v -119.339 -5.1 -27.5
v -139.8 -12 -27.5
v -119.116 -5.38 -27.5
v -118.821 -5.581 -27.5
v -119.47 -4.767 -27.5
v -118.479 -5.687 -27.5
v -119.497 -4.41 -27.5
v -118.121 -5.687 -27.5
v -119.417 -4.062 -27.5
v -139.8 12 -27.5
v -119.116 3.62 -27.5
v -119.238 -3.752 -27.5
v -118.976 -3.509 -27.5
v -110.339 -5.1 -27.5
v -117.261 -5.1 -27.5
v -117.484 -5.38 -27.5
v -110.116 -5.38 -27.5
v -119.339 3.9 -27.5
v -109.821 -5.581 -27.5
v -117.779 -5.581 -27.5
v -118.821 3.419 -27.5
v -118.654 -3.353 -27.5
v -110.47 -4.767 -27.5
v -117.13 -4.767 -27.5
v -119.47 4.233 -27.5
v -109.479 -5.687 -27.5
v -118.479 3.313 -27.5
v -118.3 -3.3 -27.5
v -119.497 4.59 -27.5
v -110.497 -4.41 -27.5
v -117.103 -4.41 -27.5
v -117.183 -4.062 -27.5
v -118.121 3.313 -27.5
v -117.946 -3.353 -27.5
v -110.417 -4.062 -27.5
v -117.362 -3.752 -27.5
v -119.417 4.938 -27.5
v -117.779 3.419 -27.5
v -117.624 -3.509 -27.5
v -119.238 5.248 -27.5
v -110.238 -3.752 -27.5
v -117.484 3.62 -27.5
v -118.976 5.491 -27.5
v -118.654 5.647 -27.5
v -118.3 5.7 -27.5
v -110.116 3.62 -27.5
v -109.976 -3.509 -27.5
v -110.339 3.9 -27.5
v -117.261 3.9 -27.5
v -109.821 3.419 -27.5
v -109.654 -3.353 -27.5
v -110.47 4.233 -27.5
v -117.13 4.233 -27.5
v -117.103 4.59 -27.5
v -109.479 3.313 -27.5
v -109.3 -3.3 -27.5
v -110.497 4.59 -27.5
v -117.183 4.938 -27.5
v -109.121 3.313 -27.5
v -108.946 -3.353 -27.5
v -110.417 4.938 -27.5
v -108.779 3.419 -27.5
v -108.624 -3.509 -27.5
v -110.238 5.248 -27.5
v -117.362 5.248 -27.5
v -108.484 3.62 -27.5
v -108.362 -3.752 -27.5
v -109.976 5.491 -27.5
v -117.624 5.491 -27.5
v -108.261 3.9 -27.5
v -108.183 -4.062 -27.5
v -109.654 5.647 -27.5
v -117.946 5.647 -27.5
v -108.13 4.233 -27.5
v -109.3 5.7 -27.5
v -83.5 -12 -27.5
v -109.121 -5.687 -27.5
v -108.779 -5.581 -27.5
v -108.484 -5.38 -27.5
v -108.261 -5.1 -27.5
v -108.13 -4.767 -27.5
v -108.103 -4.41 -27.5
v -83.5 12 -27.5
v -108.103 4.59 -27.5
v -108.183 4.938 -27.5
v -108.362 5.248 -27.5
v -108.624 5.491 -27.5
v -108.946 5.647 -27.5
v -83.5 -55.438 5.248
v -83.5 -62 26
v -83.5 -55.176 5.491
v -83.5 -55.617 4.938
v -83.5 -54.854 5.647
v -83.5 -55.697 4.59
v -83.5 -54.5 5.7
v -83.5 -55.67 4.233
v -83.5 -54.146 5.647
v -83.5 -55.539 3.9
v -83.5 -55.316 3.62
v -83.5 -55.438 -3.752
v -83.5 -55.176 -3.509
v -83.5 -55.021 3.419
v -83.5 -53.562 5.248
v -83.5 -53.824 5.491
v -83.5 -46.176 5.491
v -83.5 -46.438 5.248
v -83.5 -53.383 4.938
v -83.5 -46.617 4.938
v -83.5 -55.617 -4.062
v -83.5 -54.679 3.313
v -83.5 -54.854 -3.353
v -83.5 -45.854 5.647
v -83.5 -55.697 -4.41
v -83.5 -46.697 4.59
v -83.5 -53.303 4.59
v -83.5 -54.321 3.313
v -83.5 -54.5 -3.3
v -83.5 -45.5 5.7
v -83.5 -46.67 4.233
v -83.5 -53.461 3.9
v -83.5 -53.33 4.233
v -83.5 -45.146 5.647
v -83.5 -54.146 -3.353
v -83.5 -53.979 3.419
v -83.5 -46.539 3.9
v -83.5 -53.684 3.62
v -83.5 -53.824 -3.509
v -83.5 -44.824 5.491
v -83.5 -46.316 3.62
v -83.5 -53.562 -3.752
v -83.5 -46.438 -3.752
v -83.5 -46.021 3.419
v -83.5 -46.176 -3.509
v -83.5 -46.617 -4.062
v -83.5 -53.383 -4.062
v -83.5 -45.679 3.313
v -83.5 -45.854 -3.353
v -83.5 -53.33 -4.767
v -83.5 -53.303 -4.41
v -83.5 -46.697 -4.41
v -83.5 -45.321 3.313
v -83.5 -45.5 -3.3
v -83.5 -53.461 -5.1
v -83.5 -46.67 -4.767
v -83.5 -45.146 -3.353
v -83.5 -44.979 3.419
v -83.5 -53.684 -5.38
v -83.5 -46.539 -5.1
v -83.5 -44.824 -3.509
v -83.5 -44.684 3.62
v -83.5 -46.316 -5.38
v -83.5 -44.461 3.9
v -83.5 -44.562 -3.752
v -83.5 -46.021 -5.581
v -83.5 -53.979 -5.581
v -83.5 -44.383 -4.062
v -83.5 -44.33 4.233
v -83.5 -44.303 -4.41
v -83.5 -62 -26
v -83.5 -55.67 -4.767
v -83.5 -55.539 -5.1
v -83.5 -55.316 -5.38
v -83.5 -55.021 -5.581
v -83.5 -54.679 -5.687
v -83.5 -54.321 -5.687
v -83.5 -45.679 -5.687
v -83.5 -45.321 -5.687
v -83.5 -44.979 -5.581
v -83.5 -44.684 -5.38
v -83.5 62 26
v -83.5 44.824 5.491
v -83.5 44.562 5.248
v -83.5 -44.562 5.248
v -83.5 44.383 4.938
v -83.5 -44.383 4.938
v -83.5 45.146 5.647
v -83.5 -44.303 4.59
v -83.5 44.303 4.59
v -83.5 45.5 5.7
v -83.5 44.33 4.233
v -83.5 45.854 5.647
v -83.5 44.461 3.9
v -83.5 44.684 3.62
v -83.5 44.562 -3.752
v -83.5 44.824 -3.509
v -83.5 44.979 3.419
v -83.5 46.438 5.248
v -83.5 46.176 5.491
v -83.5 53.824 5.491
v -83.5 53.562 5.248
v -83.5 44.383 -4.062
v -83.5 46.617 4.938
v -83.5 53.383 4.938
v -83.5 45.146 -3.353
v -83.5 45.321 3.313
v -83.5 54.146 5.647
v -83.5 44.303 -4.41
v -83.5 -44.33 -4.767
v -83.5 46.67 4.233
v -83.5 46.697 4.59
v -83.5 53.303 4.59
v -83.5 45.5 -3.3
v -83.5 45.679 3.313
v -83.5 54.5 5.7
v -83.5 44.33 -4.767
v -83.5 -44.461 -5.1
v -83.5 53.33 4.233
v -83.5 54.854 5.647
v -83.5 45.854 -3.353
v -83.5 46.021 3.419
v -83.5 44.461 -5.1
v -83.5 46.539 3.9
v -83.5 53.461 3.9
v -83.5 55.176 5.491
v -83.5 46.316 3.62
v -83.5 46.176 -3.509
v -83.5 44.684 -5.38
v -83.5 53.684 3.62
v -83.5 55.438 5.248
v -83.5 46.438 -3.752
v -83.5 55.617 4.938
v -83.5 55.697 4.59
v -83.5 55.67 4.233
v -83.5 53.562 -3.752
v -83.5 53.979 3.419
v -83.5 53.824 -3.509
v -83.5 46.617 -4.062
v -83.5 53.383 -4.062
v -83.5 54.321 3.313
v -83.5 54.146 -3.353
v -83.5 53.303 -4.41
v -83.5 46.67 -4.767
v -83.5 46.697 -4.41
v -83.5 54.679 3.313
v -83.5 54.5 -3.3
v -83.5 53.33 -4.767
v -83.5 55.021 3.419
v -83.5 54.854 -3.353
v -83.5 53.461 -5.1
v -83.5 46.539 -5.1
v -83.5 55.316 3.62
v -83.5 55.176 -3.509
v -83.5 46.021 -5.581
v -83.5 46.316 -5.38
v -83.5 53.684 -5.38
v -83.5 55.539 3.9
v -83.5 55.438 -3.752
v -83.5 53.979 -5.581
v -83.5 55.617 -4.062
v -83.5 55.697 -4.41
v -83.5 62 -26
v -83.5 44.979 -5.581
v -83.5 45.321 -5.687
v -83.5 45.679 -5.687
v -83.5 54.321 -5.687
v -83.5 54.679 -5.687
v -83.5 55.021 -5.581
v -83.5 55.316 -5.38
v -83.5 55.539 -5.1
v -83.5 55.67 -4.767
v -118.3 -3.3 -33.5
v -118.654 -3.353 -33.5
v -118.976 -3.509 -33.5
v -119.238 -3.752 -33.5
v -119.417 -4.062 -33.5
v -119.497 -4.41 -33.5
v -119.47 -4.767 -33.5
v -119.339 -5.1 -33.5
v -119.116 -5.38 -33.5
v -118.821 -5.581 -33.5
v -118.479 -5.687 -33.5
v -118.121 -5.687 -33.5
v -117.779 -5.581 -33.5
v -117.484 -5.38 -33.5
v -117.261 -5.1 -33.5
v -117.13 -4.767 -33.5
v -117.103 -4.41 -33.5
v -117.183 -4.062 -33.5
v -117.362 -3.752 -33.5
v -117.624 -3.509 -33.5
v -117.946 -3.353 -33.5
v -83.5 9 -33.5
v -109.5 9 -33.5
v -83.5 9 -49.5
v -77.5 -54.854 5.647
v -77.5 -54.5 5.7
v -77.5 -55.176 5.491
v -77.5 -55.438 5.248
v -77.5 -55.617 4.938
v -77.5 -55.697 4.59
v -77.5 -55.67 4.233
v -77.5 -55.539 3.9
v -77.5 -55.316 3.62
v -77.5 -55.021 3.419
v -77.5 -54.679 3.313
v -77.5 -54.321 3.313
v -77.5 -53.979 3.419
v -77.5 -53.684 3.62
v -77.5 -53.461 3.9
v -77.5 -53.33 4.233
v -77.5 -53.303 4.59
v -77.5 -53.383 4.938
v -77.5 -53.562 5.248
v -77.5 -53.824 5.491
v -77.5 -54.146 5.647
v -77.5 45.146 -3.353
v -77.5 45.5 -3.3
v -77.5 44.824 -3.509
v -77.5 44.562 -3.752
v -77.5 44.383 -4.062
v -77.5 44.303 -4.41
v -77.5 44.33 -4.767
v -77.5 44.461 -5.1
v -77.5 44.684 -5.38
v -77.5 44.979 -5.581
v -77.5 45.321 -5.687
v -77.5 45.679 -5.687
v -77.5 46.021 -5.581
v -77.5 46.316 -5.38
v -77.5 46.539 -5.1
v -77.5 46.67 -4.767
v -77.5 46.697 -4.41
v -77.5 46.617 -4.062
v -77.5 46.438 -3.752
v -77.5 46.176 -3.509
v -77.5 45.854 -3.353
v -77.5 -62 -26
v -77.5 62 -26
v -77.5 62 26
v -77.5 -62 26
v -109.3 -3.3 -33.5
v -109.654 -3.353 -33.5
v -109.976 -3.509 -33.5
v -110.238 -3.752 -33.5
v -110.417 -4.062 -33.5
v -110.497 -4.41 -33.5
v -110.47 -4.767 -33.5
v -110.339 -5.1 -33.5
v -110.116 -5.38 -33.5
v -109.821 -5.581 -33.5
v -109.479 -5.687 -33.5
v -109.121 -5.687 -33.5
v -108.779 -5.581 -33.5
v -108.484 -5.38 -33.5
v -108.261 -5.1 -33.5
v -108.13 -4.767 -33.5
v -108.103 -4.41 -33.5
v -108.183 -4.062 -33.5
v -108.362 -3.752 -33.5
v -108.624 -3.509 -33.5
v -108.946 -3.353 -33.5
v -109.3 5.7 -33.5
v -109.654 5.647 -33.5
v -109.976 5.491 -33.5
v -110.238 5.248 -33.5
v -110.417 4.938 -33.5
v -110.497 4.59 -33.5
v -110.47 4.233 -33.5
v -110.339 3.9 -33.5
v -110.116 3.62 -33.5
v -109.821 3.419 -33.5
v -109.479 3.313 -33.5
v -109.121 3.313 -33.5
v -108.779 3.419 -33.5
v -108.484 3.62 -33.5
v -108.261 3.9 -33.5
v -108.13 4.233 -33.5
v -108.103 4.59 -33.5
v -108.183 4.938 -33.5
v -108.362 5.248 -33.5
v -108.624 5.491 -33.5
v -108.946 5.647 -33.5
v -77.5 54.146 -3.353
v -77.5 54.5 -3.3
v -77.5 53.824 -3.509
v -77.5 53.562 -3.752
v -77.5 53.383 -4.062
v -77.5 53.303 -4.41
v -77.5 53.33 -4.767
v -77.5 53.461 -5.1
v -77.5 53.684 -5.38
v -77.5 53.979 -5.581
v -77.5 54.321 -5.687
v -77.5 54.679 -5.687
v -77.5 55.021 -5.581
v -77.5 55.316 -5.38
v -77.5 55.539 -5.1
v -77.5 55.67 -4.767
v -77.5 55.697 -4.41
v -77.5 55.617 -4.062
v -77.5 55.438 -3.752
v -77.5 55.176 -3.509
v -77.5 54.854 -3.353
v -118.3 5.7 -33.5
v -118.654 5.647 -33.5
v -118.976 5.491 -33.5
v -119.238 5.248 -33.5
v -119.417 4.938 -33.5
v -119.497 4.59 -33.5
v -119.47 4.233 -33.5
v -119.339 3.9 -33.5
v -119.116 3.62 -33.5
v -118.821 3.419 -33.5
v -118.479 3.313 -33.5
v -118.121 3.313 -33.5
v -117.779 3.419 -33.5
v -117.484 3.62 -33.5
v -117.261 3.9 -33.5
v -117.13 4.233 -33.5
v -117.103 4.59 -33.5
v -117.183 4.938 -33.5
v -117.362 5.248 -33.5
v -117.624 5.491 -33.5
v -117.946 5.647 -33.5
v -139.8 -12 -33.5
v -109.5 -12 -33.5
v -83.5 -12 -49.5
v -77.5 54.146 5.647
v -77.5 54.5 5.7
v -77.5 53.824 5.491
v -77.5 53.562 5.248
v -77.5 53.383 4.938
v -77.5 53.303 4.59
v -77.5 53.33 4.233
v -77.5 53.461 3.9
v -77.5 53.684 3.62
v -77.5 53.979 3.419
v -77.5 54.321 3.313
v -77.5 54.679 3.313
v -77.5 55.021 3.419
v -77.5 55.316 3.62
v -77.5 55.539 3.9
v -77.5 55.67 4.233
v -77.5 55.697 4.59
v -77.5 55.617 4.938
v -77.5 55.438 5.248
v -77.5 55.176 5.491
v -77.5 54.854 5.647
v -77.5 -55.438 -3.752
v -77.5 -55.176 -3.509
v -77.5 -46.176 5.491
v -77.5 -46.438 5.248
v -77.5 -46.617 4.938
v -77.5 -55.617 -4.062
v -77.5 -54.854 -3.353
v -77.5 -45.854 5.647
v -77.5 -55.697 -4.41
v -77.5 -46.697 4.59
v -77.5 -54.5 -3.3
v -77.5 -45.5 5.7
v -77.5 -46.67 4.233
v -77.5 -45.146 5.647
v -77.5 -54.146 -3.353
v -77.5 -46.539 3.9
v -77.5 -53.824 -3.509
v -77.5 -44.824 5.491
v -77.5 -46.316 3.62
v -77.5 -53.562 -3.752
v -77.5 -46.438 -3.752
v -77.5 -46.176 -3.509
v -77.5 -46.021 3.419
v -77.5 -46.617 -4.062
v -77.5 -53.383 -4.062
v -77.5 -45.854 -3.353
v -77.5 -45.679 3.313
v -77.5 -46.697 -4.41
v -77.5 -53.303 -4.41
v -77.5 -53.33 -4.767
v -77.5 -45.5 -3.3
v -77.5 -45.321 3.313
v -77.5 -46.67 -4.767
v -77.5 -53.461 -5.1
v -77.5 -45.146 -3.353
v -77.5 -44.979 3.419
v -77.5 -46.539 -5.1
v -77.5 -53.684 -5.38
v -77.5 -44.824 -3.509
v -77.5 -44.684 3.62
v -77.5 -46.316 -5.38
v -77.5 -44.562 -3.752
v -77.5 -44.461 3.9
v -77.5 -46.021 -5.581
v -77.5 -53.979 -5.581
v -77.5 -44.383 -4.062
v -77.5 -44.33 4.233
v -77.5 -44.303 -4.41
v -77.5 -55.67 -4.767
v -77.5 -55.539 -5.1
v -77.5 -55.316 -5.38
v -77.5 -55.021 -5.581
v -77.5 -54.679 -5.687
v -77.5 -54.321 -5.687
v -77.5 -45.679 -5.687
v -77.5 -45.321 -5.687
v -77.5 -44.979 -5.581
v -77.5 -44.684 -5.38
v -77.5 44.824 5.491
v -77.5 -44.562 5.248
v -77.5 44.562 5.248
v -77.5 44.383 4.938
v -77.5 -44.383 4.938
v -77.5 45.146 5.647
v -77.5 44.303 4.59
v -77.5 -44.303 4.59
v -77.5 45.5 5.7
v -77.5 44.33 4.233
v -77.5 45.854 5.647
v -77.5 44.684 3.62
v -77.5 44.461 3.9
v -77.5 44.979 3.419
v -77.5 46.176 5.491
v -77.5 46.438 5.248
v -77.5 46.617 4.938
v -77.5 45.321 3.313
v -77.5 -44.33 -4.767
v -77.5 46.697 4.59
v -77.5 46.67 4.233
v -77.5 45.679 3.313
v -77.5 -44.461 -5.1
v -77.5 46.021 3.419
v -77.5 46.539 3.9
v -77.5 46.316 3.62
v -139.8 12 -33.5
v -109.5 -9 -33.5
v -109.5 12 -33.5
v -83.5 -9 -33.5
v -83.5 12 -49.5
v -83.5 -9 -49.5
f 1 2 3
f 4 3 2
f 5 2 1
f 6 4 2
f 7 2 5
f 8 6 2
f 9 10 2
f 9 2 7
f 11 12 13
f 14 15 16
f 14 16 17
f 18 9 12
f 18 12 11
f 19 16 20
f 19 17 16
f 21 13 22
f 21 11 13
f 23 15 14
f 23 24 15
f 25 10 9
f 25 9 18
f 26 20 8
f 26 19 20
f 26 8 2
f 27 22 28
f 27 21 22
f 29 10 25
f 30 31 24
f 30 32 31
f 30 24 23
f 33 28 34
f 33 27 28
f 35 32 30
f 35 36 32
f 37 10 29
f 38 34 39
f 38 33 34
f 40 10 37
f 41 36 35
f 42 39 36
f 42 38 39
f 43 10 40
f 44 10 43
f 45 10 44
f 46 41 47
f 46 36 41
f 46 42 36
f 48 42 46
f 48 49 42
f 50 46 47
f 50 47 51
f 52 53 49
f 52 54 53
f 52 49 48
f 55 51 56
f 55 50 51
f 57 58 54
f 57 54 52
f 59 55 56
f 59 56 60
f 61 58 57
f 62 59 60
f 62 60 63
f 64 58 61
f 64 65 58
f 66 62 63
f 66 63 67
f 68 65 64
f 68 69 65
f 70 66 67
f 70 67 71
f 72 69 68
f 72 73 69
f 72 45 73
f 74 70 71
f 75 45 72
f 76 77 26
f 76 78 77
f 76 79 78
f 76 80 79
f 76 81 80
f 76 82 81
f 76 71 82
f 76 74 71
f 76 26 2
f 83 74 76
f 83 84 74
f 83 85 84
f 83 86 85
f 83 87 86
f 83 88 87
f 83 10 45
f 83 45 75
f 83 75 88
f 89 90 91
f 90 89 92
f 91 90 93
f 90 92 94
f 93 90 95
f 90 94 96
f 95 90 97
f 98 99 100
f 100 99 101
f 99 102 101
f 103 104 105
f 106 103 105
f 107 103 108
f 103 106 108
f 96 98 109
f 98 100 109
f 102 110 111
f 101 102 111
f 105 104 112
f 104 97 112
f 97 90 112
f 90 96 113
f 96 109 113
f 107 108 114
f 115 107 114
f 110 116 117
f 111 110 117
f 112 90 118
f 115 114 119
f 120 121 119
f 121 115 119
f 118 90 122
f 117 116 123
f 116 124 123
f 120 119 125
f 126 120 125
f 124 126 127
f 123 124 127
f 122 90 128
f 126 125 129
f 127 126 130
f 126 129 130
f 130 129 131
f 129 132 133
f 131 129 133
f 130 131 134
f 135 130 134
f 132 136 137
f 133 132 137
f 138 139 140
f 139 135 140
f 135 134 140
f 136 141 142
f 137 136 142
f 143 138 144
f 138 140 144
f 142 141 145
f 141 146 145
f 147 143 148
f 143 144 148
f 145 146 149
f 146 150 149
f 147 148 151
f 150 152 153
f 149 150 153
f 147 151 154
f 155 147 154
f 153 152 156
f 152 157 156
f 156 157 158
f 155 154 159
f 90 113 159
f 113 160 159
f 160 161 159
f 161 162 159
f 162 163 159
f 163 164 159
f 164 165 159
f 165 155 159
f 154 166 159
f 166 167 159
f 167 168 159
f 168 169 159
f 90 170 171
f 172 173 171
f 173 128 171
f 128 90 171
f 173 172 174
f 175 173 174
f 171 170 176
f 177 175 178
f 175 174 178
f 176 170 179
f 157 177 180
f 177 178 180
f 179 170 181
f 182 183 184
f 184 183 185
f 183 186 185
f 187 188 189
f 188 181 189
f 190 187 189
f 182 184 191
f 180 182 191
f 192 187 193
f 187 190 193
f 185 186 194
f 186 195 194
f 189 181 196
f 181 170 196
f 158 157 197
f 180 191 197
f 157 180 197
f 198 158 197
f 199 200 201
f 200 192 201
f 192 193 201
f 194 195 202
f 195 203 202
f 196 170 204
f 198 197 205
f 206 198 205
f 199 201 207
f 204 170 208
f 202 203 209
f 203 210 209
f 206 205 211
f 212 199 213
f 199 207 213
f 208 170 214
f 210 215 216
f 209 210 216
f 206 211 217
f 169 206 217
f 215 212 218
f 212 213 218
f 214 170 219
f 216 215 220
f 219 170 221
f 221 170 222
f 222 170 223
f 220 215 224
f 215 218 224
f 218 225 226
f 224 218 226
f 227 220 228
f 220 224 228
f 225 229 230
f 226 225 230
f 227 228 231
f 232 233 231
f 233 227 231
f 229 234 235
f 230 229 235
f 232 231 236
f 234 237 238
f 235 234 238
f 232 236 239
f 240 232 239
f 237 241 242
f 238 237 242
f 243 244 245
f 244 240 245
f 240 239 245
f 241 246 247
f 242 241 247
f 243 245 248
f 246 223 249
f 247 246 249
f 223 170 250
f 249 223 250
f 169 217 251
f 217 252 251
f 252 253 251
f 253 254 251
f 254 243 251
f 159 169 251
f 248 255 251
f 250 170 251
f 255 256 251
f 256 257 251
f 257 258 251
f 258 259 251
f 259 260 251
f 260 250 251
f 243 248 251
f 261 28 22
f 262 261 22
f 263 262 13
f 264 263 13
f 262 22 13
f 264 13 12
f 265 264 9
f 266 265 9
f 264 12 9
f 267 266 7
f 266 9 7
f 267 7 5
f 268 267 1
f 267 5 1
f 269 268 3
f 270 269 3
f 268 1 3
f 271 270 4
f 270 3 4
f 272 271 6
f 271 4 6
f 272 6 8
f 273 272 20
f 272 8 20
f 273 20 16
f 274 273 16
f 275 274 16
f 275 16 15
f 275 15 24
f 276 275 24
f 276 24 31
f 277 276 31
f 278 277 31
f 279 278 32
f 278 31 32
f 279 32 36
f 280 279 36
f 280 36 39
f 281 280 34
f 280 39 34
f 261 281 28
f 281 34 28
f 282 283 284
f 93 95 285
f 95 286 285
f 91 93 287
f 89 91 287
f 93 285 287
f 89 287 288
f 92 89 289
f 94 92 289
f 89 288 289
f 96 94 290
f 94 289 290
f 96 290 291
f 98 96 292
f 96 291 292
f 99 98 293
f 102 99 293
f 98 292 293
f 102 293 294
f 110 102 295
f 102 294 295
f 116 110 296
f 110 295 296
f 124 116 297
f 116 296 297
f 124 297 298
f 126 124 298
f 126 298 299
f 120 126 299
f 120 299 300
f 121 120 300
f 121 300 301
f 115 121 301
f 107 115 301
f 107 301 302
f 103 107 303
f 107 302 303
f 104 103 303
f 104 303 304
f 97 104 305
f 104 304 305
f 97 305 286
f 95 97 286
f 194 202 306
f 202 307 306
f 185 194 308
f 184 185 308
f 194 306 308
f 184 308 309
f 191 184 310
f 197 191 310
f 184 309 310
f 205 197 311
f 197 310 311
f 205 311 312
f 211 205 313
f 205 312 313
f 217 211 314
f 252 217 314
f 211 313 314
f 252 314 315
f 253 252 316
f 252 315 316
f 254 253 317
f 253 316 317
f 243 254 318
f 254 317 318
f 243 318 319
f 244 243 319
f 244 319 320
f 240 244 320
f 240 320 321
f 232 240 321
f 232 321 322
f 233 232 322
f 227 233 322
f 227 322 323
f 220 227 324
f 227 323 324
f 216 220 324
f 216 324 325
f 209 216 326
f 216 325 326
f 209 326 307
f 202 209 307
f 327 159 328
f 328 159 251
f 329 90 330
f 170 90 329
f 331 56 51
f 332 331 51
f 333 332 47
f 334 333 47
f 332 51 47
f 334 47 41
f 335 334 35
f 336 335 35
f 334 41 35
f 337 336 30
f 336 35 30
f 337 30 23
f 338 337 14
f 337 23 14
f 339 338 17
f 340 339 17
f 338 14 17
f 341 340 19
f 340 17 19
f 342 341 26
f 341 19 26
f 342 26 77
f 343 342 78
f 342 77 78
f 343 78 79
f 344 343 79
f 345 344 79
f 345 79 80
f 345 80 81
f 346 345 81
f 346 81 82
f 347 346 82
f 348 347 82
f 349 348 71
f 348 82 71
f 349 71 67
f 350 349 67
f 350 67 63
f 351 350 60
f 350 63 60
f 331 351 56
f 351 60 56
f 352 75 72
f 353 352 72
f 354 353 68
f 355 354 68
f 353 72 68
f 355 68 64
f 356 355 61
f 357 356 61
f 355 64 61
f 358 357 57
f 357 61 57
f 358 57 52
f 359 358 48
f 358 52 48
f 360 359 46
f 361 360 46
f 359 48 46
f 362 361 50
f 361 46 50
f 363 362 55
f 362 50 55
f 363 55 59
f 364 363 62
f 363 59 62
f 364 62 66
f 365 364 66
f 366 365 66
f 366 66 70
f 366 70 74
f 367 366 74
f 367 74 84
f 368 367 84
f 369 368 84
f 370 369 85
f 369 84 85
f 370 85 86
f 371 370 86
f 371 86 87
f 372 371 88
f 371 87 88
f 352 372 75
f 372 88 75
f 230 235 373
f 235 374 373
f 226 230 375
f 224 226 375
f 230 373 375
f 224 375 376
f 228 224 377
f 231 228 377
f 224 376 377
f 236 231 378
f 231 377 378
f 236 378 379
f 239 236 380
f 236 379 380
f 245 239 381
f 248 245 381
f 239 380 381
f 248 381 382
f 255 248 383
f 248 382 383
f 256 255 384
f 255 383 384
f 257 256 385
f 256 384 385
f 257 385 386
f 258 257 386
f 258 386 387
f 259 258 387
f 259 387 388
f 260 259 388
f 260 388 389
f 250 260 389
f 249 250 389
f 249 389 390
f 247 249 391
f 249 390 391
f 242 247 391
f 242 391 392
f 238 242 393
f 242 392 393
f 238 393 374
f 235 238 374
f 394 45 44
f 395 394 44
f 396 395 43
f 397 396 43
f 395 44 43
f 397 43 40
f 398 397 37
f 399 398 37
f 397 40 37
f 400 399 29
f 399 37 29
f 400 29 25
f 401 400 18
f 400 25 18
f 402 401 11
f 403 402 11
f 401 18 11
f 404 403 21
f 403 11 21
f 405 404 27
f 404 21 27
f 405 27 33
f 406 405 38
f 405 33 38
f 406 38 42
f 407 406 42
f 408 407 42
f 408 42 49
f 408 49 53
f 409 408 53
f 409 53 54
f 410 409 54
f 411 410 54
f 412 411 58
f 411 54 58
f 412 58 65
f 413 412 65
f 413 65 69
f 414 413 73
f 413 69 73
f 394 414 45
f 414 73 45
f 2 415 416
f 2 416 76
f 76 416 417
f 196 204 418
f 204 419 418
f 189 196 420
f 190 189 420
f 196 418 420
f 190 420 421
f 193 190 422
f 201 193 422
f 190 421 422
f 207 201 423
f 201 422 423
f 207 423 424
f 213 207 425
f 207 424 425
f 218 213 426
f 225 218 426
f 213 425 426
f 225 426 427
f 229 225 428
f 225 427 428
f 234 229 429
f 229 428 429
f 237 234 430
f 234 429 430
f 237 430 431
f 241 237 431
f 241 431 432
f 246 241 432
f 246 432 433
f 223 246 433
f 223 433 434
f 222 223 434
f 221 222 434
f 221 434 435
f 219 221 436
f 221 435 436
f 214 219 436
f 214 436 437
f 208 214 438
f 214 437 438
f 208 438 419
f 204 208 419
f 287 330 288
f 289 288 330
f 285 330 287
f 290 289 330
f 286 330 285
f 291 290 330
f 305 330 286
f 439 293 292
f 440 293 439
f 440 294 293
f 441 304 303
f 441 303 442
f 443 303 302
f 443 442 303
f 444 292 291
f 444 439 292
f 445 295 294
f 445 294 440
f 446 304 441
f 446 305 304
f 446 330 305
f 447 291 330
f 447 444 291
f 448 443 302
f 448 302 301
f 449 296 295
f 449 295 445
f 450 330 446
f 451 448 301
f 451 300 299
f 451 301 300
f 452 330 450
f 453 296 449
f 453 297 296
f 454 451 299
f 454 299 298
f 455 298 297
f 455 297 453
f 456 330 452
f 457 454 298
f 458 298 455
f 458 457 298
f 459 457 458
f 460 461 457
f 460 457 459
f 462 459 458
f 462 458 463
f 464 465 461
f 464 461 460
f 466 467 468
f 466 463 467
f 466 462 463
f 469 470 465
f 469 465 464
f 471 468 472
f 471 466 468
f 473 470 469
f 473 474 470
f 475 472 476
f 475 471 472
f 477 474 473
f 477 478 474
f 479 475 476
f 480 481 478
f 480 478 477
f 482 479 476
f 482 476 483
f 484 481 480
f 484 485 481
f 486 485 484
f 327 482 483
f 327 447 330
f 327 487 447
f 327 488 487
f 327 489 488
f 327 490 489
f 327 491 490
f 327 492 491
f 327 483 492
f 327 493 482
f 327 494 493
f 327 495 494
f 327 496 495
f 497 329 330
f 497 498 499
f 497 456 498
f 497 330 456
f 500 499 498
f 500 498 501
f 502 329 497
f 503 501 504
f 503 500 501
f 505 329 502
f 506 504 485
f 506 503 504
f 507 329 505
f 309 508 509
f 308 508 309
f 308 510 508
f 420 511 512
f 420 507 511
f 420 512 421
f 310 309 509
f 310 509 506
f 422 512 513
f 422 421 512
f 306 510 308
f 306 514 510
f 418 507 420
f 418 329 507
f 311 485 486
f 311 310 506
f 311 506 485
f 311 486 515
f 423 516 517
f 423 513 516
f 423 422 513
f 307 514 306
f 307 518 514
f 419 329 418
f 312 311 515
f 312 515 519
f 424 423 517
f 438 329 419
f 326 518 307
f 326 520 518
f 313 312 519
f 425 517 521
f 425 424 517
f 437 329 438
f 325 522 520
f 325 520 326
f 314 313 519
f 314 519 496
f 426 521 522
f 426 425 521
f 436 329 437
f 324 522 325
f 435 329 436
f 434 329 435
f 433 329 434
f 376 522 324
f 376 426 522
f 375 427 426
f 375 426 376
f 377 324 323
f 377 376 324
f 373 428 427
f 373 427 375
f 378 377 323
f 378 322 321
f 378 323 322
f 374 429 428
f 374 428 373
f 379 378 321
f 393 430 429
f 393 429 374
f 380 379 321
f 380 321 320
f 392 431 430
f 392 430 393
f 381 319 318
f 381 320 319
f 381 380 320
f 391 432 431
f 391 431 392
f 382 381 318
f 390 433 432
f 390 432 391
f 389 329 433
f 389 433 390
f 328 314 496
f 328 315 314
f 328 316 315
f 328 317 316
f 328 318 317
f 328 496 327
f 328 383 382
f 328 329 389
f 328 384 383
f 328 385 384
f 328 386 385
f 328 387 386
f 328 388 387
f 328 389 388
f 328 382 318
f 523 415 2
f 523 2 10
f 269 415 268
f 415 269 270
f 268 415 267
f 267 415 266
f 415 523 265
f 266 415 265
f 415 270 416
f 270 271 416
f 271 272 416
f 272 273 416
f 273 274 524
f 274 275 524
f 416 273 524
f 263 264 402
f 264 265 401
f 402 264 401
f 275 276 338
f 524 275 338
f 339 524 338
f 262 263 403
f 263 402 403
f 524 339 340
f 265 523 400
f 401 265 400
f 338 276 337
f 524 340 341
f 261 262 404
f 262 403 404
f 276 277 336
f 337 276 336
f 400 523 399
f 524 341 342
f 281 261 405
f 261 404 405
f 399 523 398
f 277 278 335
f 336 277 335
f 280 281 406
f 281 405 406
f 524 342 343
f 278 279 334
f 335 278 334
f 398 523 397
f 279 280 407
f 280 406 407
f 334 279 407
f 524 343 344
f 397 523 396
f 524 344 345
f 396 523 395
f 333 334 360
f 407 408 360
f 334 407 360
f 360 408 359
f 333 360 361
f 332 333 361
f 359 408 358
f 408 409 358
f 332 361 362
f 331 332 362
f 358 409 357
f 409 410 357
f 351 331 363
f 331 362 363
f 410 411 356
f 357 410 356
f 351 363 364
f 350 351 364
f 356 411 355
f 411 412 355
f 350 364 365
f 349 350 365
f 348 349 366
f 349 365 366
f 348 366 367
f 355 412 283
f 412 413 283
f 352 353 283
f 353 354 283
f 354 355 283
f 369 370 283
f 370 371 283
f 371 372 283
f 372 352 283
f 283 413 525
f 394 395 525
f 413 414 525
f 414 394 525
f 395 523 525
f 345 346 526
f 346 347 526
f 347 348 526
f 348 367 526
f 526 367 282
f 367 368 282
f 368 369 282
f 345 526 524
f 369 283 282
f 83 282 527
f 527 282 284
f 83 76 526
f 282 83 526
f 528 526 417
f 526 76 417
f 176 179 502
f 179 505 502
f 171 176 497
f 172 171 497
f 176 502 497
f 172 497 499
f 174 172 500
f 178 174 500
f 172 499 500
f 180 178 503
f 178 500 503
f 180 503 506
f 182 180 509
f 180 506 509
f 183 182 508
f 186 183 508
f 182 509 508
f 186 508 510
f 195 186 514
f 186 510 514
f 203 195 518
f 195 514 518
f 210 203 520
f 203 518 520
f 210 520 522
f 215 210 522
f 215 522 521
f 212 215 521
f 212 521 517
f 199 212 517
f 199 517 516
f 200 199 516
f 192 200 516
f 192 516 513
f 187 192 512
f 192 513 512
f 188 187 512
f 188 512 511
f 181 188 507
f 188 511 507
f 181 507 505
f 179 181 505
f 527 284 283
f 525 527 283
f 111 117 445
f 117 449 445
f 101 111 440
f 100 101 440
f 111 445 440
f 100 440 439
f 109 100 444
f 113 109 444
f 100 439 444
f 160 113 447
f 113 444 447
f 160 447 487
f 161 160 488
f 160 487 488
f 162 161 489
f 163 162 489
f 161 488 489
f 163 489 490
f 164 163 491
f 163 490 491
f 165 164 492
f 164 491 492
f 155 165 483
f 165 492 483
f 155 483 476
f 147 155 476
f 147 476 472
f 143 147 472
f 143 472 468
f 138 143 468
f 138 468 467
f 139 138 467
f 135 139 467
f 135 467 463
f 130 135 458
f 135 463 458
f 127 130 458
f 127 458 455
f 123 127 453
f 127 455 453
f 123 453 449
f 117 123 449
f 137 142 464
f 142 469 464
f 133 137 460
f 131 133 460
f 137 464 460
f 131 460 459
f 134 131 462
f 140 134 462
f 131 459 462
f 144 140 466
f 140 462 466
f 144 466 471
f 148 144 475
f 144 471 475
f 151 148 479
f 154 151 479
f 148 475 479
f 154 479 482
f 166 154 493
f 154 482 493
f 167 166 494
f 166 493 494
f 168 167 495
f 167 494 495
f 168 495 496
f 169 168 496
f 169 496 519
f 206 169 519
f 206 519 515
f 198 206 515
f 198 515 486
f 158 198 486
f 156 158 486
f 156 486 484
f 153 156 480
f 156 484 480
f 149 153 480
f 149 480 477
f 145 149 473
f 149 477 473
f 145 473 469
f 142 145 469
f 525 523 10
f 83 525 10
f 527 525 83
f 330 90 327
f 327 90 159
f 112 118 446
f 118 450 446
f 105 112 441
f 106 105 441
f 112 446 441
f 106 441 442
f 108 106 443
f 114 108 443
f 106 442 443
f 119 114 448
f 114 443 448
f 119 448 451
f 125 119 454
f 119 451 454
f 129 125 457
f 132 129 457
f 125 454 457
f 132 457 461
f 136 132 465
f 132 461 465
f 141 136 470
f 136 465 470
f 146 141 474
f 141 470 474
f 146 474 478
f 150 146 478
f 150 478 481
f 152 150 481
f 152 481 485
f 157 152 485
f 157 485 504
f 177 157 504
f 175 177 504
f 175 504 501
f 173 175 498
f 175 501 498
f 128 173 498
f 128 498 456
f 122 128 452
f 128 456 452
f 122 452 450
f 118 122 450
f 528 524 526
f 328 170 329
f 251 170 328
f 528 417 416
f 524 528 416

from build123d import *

# Parameters (mm, degrees)
SKETCH1_W           = 52
SKETCH1_H           = 124
BOSS_EXTRUDE1_DEPTH = 6
SKETCH2_W           = 56.3
SKETCH2_H           = 24
BOSS_EXTRUDE2_DEPTH = 6
BOSS_EXTRUDE3_DEPTH = 3
BOSS_EXTRUDE4_DEPTH = 3
SKETCH5_W           = 1.2
SKETCH5_H           = 6
SKETCH7_W           = 1.2
SKETCH7_H           = 6
SKETCH9_W           = 1.2
SKETCH9_H           = 6
SKETCH11_W          = 1.2
SKETCH11_H          = 6
SKETCH13_W          = 1.2
SKETCH13_H          = 6
SKETCH15_W          = 1.2
SKETCH15_H          = 6
SKETCH17_W          = 1.2
SKETCH17_H          = 6
SKETCH19_W          = 1.2
SKETCH19_H          = 6
SKETCH21_W          = 1.2
SKETCH21_H          = 59.5
SKETCH23_W          = 1.2
SKETCH23_H          = 59.5
SKETCH25_W          = 1.2
SKETCH25_H          = 59.5
SKETCH27_W          = 1.2
SKETCH27_H          = 59.5


with BuildPart() as part:
    # Sketch1 → Boss-Extrude1 (new body)
    with BuildSketch(Plane(origin=(-83.5, 0, 0), x_dir=(0, 0, -1), z_dir=(1, 0, 0))):
        Rectangle(SKETCH1_W, SKETCH1_H)
    extrude(amount=BOSS_EXTRUDE1_DEPTH)

    # Sketch5 → M2 Clearance Hole1 (revolve, cut)
    with BuildSketch(Plane(origin=(-83.5, 45.5, -4.5), x_dir=(0, 0, 1), z_dir=(0, 1, 0))):
        with Locations((0.6, 3)):
            Rectangle(SKETCH5_W, SKETCH5_H)
    revolve(axis=Axis((-89.85, 45.5, -4.5), (1, 0, 0)), mode=Mode.SUBTRACT)

    # Sketch7 → M2 Clearance Hole2 (revolve, cut)
    with BuildSketch(Plane(origin=(-83.5, 45.5, 4.5), x_dir=(0, 0, 1), z_dir=(0, 1, 0))):
        with Locations((0.6, 3)):
            Rectangle(SKETCH7_W, SKETCH7_H)
    revolve(axis=Axis((-89.85, 45.5, 4.5), (1, 0, 0)), mode=Mode.SUBTRACT)

    # Sketch9 → M2 Clearance Hole3 (revolve, cut)
    with BuildSketch(Plane(origin=(-83.5, 54.5, -4.5), x_dir=(0, 0, 1), z_dir=(0, 1, 0))):
        with Locations((0.6, 3)):
            Rectangle(SKETCH9_W, SKETCH9_H)
    revolve(axis=Axis((-89.85, 54.5, -4.5), (1, 0, 0)), mode=Mode.SUBTRACT)

    # Sketch11 → M2 Clearance Hole4 (revolve, cut)
    with BuildSketch(Plane(origin=(-83.5, 54.5, 4.5), x_dir=(0, 0, 1), z_dir=(0, 1, 0))):
        with Locations((0.6, 3)):
            Rectangle(SKETCH11_W, SKETCH11_H)
    revolve(axis=Axis((-89.85, 54.5, 4.5), (1, 0, 0)), mode=Mode.SUBTRACT)

    # Sketch13 → M2 Clearance Hole5 (revolve, cut)
    with BuildSketch(Plane(origin=(-83.5, -54.5, -4.5), x_dir=(0, 0, 1), z_dir=(0, 1, 0))):
        with Locations((0.6, 3)):
            Rectangle(SKETCH13_W, SKETCH13_H)
    revolve(axis=Axis((-89.85, -54.5, -4.5), (1, 0, 0)), mode=Mode.SUBTRACT)

    # Sketch15 → M2 Clearance Hole6 (revolve, cut)
    with BuildSketch(Plane(origin=(-83.5, -54.5, 4.5), x_dir=(0, 0, 1), z_dir=(0, 1, 0))):
        with Locations((0.6, 3)):
            Rectangle(SKETCH15_W, SKETCH15_H)
    revolve(axis=Axis((-89.85, -54.5, 4.5), (1, 0, 0)), mode=Mode.SUBTRACT)

    # Sketch17 → M2 Clearance Hole7 (revolve, cut)
    with BuildSketch(Plane(origin=(-83.5, -45.5, -4.5), x_dir=(0, 0, 1), z_dir=(0, 1, 0))):
        with Locations((0.6, 3)):
            Rectangle(SKETCH17_W, SKETCH17_H)
    revolve(axis=Axis((-89.85, -45.5, -4.5), (1, 0, 0)), mode=Mode.SUBTRACT)

    # Sketch19 → M2 Clearance Hole8 (revolve, cut)
    with BuildSketch(Plane(origin=(-83.5, -45.5, 4.5), x_dir=(0, 0, 1), z_dir=(0, 1, 0))):
        with Locations((0.6, 3)):
            Rectangle(SKETCH19_W, SKETCH19_H)
    revolve(axis=Axis((-89.85, -45.5, 4.5), (1, 0, 0)), mode=Mode.SUBTRACT)


with BuildPart() as body_2:
    # Sketch2 → Boss-Extrude2 (new body)
    with BuildSketch(Plane.XY.offset(-33.5)):
        with Locations((-111.65, 0)):
            Rectangle(SKETCH2_W, SKETCH2_H)
    extrude(amount=BOSS_EXTRUDE2_DEPTH)

    # Sketch3 → Boss-Extrude3 (add)
    with BuildSketch(Plane(origin=(0, 9, 0), x_dir=(1, 0, 0), z_dir=(0, 1, 0))):
        Polygon((-83.5, 33.5), (-83.5, 49.5), (-109.5, 33.5), align=None)
    extrude(amount=BOSS_EXTRUDE3_DEPTH)

    # Sketch4 → Boss-Extrude4 (add)
    with BuildSketch(Plane(origin=(0, -12, 0), x_dir=(1, 0, 0), z_dir=(0, 1, 0))):
        Polygon((-83.5, 33.5), (-83.5, 49.5), (-109.5, 33.5), align=None)
    extrude(amount=BOSS_EXTRUDE4_DEPTH)

    # Sketch21 → M2 Clearance Hole9 (revolve, cut)
    with BuildSketch(Plane(origin=(-109.3, 4.5, -33.5), x_dir=(0, 1, 0), z_dir=(1, 0, 0))):
        with Locations((0.6, 29.75)):
            Rectangle(SKETCH21_W, SKETCH21_H)
    revolve(axis=Axis((-109.3, 4.5, -39.85), (0, 0, 1)), mode=Mode.SUBTRACT)

    # Sketch23 → M2 Clearance Hole10 (revolve, cut)
    with BuildSketch(Plane(origin=(-109.3, -4.5, -33.5), x_dir=(0, 1, 0), z_dir=(1, 0, 0))):
        with Locations((0.6, 29.75)):
            Rectangle(SKETCH23_W, SKETCH23_H)
    revolve(axis=Axis((-109.3, -4.5, -39.85), (0, 0, 1)), mode=Mode.SUBTRACT)

    # Sketch25 → M2 Clearance Hole11 (revolve, cut)
    with BuildSketch(Plane(origin=(-118.3, 4.5, -33.5), x_dir=(0, 1, 0), z_dir=(1, 0, 0))):
        with Locations((0.6, 29.75)):
            Rectangle(SKETCH25_W, SKETCH25_H)
    revolve(axis=Axis((-118.3, 4.5, -39.85), (0, 0, 1)), mode=Mode.SUBTRACT)

    # Sketch27 → M2 Clearance Hole12 (revolve, cut)
    with BuildSketch(Plane(origin=(-118.3, -4.5, -33.5), x_dir=(0, 1, 0), z_dir=(1, 0, 0))):
        with Locations((0.6, 29.75)):
            Rectangle(SKETCH27_W, SKETCH27_H)
    revolve(axis=Axis((-118.3, -4.5, -39.85), (0, 0, 1)), mode=Mode.SUBTRACT)


solid = Compound([part.part, body_2.part])
